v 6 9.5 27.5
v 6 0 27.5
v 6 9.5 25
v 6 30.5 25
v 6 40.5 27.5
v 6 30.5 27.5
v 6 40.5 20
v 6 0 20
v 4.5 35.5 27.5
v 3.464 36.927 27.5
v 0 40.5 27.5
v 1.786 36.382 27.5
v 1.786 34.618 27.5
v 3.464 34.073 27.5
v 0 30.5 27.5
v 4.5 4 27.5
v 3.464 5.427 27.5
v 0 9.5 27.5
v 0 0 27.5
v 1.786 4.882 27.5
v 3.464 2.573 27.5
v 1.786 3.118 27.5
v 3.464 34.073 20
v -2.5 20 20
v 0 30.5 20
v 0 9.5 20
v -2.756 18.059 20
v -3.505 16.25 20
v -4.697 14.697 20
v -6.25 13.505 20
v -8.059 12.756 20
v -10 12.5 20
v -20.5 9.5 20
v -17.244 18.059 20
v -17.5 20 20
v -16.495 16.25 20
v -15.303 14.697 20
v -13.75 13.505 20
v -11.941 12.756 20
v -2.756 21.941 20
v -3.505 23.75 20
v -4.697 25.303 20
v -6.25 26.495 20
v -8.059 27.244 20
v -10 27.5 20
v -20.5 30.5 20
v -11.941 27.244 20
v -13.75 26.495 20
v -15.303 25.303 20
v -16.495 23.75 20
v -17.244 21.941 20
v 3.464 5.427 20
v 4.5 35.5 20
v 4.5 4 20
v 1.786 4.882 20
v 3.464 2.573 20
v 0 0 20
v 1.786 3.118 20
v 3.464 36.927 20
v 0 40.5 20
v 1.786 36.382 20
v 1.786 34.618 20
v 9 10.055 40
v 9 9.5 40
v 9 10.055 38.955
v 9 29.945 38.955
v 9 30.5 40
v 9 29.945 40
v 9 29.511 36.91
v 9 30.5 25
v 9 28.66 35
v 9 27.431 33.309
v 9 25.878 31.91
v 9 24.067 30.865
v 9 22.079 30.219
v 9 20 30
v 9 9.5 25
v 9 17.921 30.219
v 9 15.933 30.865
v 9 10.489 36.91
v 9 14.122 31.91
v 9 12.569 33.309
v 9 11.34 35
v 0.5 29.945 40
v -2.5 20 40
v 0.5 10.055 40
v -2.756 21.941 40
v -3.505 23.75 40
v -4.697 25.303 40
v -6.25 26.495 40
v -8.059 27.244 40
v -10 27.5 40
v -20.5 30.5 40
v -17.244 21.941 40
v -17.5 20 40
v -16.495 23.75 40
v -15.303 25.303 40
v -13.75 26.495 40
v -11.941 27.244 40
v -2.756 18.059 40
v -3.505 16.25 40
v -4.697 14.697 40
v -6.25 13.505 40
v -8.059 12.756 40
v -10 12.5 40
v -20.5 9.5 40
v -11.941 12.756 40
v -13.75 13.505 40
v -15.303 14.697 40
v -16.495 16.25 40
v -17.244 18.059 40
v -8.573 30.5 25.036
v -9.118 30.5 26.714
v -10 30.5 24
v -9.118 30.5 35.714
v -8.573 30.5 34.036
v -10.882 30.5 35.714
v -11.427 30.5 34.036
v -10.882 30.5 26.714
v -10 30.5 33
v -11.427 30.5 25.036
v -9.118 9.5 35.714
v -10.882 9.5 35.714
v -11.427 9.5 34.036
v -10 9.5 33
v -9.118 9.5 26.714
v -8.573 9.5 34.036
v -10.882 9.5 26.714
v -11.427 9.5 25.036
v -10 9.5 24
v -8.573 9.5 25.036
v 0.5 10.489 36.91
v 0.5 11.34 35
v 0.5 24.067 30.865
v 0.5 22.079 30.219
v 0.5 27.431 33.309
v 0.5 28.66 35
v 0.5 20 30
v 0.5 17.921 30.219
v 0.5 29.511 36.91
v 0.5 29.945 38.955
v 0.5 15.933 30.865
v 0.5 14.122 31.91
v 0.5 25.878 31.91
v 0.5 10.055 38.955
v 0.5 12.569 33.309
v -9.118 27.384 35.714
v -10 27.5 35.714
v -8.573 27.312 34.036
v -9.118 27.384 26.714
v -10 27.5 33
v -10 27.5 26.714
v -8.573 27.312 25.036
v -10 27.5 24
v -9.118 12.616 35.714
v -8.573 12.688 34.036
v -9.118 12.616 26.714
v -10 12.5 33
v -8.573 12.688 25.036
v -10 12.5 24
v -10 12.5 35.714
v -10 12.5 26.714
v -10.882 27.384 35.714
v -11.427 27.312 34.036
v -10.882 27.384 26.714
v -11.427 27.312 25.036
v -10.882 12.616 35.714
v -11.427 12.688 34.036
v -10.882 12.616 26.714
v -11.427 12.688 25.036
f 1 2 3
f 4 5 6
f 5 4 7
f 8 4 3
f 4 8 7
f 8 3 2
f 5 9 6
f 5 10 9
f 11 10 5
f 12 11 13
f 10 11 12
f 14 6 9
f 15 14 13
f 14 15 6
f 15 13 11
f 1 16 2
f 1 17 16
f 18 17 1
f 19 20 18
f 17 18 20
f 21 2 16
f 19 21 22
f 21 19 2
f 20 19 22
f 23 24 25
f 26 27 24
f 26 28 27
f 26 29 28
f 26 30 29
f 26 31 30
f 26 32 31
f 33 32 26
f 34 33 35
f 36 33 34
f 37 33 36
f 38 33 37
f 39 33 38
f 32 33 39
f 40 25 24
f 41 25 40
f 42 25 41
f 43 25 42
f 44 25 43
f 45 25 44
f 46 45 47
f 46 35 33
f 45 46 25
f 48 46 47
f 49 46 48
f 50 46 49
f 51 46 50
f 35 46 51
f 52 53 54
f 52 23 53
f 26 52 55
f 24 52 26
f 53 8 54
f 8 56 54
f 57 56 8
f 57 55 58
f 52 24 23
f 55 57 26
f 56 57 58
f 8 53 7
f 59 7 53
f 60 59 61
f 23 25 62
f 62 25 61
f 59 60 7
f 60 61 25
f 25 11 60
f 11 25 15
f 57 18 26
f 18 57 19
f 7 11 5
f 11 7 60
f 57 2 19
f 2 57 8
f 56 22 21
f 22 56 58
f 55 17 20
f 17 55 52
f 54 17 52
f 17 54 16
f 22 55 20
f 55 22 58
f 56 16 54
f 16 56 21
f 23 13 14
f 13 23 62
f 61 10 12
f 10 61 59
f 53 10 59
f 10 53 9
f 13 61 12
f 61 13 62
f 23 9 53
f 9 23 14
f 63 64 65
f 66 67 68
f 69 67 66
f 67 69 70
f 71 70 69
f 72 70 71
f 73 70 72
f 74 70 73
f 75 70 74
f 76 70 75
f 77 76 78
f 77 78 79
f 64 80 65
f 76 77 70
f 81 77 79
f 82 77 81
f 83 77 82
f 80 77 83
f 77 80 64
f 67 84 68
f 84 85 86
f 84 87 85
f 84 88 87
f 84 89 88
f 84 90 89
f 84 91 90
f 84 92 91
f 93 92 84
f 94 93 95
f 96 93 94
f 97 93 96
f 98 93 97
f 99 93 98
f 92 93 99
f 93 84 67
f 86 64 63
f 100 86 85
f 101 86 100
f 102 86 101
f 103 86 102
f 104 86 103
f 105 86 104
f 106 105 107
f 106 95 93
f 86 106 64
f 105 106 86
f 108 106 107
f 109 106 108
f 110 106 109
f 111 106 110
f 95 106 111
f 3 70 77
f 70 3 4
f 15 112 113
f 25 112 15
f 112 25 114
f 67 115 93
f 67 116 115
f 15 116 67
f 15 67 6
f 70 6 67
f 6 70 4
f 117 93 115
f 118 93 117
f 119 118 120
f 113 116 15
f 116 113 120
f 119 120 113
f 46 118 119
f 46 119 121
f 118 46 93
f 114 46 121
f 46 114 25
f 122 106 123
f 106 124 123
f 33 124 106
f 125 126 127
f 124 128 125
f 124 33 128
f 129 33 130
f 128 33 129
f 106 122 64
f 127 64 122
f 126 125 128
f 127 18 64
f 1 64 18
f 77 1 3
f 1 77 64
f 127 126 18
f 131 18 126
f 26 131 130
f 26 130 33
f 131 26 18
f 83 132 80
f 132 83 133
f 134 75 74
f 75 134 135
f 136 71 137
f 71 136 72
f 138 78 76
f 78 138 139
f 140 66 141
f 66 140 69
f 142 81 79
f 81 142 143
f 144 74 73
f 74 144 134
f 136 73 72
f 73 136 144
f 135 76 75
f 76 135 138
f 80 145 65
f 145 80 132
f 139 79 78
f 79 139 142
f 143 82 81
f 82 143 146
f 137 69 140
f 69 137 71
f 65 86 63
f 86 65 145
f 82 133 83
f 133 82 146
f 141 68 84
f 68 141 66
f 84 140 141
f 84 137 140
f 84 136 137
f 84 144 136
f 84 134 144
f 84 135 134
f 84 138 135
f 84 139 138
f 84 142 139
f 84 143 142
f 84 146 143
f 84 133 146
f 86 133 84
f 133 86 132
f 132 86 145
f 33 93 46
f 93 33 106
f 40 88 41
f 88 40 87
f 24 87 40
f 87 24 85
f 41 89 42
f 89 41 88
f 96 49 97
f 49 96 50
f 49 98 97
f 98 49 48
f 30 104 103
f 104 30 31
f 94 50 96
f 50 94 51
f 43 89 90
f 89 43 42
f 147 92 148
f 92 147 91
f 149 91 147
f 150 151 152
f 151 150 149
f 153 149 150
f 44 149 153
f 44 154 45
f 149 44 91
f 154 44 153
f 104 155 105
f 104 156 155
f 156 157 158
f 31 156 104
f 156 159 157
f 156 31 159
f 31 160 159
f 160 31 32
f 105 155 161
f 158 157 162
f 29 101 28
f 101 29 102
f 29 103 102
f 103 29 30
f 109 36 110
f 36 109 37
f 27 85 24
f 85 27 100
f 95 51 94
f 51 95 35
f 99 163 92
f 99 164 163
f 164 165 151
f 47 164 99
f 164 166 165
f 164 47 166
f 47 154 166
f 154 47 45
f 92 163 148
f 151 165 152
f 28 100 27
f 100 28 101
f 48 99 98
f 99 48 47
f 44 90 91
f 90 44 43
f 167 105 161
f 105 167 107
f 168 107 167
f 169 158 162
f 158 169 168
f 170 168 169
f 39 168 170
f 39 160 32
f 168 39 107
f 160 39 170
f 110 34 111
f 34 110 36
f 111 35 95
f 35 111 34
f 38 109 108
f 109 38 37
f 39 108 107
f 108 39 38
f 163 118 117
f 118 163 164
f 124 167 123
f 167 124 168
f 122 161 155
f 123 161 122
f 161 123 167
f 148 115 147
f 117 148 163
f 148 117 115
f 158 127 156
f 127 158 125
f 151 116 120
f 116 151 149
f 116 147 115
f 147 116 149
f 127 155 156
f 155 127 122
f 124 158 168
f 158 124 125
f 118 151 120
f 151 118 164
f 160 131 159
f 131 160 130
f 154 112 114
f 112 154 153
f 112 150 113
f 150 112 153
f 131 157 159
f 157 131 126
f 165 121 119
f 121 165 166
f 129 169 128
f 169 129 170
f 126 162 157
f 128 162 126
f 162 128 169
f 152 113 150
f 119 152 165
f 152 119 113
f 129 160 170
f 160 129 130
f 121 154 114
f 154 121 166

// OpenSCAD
module existingMount() {
    module m2rod() {
        translate([30,235,-10]) { rotate([90,90,0]) { rod2(); } }
    translate([50,235,-10]) { rotate([90,90,0]) { rod2(); } }
}
module rod2() {
    cylinder(400,3.5,4.5,true);
}
module otherCarridge() {
    difference() {
        translate([215,175,5]) {
            cube([50,40,45]); 
            translate([25,0,0]) { 
                difference() {
                    cube([15,40,55]); 
                    translate([6,-1,1]) { cube([2,50,55]); }
                }
            }
        }
        translate([214.9,183.5,38.1]) {color([1,0,0]) {
        cube([16,23,12]);
        }}
        
        translate([200,17.5,25]) { m2rod();}
        translate([200,17.5,25]) { m2rod();}
    }
    
    
}

translate([-204.5,-175,-5]) { otherCarridge(); }
}

// existingMount();

module support_bracket() {
difference() {
    cube([12,8.5,45]);
    
    translate([-0.50,-0.5,10]) { cube([7,9.5,25]); }
    
    translate([3,4,5]) {cylinder(45,1.5,1.5,false);}
    translate([10,-1,33]) { cube([3,10,12.1]); }
}
}



module penCarrier() {
difference() {
translate([-0.0,-0,20]) { cube([6,40.5,7.5]); }
translate([3,4,5]) {cylinder(45,1.5,1.5,false);}
translate([3,35.5,5]) {cylinder(45,1.5,1.5,false);} 
}
difference() {
translate([0,9.5,25]) { cube([9,21,15]); }
translate([-1,20,40]) {rotate([0,90,0]) { cylinder(11,10,10,false); }}
}
translate([-10,20,30]) { importedMount(); }
}

penCarrier();
/*
support_bracket();
translate([0,31.5,0]) {
    
    support_bracket();
}*/


module importedMount() {
    difference() {
cube([21,21,20], true); 
cylinder(120,7.5,7.5, true);

translate([0,0,4.5]) {rotate([90,90,0]) { cylinder(40,1.5,1.5, true);}}
translate([0,0,-4.5]) {rotate([90,90,0]) { cylinder(40,1.5,1.5, true);}}
}
}
